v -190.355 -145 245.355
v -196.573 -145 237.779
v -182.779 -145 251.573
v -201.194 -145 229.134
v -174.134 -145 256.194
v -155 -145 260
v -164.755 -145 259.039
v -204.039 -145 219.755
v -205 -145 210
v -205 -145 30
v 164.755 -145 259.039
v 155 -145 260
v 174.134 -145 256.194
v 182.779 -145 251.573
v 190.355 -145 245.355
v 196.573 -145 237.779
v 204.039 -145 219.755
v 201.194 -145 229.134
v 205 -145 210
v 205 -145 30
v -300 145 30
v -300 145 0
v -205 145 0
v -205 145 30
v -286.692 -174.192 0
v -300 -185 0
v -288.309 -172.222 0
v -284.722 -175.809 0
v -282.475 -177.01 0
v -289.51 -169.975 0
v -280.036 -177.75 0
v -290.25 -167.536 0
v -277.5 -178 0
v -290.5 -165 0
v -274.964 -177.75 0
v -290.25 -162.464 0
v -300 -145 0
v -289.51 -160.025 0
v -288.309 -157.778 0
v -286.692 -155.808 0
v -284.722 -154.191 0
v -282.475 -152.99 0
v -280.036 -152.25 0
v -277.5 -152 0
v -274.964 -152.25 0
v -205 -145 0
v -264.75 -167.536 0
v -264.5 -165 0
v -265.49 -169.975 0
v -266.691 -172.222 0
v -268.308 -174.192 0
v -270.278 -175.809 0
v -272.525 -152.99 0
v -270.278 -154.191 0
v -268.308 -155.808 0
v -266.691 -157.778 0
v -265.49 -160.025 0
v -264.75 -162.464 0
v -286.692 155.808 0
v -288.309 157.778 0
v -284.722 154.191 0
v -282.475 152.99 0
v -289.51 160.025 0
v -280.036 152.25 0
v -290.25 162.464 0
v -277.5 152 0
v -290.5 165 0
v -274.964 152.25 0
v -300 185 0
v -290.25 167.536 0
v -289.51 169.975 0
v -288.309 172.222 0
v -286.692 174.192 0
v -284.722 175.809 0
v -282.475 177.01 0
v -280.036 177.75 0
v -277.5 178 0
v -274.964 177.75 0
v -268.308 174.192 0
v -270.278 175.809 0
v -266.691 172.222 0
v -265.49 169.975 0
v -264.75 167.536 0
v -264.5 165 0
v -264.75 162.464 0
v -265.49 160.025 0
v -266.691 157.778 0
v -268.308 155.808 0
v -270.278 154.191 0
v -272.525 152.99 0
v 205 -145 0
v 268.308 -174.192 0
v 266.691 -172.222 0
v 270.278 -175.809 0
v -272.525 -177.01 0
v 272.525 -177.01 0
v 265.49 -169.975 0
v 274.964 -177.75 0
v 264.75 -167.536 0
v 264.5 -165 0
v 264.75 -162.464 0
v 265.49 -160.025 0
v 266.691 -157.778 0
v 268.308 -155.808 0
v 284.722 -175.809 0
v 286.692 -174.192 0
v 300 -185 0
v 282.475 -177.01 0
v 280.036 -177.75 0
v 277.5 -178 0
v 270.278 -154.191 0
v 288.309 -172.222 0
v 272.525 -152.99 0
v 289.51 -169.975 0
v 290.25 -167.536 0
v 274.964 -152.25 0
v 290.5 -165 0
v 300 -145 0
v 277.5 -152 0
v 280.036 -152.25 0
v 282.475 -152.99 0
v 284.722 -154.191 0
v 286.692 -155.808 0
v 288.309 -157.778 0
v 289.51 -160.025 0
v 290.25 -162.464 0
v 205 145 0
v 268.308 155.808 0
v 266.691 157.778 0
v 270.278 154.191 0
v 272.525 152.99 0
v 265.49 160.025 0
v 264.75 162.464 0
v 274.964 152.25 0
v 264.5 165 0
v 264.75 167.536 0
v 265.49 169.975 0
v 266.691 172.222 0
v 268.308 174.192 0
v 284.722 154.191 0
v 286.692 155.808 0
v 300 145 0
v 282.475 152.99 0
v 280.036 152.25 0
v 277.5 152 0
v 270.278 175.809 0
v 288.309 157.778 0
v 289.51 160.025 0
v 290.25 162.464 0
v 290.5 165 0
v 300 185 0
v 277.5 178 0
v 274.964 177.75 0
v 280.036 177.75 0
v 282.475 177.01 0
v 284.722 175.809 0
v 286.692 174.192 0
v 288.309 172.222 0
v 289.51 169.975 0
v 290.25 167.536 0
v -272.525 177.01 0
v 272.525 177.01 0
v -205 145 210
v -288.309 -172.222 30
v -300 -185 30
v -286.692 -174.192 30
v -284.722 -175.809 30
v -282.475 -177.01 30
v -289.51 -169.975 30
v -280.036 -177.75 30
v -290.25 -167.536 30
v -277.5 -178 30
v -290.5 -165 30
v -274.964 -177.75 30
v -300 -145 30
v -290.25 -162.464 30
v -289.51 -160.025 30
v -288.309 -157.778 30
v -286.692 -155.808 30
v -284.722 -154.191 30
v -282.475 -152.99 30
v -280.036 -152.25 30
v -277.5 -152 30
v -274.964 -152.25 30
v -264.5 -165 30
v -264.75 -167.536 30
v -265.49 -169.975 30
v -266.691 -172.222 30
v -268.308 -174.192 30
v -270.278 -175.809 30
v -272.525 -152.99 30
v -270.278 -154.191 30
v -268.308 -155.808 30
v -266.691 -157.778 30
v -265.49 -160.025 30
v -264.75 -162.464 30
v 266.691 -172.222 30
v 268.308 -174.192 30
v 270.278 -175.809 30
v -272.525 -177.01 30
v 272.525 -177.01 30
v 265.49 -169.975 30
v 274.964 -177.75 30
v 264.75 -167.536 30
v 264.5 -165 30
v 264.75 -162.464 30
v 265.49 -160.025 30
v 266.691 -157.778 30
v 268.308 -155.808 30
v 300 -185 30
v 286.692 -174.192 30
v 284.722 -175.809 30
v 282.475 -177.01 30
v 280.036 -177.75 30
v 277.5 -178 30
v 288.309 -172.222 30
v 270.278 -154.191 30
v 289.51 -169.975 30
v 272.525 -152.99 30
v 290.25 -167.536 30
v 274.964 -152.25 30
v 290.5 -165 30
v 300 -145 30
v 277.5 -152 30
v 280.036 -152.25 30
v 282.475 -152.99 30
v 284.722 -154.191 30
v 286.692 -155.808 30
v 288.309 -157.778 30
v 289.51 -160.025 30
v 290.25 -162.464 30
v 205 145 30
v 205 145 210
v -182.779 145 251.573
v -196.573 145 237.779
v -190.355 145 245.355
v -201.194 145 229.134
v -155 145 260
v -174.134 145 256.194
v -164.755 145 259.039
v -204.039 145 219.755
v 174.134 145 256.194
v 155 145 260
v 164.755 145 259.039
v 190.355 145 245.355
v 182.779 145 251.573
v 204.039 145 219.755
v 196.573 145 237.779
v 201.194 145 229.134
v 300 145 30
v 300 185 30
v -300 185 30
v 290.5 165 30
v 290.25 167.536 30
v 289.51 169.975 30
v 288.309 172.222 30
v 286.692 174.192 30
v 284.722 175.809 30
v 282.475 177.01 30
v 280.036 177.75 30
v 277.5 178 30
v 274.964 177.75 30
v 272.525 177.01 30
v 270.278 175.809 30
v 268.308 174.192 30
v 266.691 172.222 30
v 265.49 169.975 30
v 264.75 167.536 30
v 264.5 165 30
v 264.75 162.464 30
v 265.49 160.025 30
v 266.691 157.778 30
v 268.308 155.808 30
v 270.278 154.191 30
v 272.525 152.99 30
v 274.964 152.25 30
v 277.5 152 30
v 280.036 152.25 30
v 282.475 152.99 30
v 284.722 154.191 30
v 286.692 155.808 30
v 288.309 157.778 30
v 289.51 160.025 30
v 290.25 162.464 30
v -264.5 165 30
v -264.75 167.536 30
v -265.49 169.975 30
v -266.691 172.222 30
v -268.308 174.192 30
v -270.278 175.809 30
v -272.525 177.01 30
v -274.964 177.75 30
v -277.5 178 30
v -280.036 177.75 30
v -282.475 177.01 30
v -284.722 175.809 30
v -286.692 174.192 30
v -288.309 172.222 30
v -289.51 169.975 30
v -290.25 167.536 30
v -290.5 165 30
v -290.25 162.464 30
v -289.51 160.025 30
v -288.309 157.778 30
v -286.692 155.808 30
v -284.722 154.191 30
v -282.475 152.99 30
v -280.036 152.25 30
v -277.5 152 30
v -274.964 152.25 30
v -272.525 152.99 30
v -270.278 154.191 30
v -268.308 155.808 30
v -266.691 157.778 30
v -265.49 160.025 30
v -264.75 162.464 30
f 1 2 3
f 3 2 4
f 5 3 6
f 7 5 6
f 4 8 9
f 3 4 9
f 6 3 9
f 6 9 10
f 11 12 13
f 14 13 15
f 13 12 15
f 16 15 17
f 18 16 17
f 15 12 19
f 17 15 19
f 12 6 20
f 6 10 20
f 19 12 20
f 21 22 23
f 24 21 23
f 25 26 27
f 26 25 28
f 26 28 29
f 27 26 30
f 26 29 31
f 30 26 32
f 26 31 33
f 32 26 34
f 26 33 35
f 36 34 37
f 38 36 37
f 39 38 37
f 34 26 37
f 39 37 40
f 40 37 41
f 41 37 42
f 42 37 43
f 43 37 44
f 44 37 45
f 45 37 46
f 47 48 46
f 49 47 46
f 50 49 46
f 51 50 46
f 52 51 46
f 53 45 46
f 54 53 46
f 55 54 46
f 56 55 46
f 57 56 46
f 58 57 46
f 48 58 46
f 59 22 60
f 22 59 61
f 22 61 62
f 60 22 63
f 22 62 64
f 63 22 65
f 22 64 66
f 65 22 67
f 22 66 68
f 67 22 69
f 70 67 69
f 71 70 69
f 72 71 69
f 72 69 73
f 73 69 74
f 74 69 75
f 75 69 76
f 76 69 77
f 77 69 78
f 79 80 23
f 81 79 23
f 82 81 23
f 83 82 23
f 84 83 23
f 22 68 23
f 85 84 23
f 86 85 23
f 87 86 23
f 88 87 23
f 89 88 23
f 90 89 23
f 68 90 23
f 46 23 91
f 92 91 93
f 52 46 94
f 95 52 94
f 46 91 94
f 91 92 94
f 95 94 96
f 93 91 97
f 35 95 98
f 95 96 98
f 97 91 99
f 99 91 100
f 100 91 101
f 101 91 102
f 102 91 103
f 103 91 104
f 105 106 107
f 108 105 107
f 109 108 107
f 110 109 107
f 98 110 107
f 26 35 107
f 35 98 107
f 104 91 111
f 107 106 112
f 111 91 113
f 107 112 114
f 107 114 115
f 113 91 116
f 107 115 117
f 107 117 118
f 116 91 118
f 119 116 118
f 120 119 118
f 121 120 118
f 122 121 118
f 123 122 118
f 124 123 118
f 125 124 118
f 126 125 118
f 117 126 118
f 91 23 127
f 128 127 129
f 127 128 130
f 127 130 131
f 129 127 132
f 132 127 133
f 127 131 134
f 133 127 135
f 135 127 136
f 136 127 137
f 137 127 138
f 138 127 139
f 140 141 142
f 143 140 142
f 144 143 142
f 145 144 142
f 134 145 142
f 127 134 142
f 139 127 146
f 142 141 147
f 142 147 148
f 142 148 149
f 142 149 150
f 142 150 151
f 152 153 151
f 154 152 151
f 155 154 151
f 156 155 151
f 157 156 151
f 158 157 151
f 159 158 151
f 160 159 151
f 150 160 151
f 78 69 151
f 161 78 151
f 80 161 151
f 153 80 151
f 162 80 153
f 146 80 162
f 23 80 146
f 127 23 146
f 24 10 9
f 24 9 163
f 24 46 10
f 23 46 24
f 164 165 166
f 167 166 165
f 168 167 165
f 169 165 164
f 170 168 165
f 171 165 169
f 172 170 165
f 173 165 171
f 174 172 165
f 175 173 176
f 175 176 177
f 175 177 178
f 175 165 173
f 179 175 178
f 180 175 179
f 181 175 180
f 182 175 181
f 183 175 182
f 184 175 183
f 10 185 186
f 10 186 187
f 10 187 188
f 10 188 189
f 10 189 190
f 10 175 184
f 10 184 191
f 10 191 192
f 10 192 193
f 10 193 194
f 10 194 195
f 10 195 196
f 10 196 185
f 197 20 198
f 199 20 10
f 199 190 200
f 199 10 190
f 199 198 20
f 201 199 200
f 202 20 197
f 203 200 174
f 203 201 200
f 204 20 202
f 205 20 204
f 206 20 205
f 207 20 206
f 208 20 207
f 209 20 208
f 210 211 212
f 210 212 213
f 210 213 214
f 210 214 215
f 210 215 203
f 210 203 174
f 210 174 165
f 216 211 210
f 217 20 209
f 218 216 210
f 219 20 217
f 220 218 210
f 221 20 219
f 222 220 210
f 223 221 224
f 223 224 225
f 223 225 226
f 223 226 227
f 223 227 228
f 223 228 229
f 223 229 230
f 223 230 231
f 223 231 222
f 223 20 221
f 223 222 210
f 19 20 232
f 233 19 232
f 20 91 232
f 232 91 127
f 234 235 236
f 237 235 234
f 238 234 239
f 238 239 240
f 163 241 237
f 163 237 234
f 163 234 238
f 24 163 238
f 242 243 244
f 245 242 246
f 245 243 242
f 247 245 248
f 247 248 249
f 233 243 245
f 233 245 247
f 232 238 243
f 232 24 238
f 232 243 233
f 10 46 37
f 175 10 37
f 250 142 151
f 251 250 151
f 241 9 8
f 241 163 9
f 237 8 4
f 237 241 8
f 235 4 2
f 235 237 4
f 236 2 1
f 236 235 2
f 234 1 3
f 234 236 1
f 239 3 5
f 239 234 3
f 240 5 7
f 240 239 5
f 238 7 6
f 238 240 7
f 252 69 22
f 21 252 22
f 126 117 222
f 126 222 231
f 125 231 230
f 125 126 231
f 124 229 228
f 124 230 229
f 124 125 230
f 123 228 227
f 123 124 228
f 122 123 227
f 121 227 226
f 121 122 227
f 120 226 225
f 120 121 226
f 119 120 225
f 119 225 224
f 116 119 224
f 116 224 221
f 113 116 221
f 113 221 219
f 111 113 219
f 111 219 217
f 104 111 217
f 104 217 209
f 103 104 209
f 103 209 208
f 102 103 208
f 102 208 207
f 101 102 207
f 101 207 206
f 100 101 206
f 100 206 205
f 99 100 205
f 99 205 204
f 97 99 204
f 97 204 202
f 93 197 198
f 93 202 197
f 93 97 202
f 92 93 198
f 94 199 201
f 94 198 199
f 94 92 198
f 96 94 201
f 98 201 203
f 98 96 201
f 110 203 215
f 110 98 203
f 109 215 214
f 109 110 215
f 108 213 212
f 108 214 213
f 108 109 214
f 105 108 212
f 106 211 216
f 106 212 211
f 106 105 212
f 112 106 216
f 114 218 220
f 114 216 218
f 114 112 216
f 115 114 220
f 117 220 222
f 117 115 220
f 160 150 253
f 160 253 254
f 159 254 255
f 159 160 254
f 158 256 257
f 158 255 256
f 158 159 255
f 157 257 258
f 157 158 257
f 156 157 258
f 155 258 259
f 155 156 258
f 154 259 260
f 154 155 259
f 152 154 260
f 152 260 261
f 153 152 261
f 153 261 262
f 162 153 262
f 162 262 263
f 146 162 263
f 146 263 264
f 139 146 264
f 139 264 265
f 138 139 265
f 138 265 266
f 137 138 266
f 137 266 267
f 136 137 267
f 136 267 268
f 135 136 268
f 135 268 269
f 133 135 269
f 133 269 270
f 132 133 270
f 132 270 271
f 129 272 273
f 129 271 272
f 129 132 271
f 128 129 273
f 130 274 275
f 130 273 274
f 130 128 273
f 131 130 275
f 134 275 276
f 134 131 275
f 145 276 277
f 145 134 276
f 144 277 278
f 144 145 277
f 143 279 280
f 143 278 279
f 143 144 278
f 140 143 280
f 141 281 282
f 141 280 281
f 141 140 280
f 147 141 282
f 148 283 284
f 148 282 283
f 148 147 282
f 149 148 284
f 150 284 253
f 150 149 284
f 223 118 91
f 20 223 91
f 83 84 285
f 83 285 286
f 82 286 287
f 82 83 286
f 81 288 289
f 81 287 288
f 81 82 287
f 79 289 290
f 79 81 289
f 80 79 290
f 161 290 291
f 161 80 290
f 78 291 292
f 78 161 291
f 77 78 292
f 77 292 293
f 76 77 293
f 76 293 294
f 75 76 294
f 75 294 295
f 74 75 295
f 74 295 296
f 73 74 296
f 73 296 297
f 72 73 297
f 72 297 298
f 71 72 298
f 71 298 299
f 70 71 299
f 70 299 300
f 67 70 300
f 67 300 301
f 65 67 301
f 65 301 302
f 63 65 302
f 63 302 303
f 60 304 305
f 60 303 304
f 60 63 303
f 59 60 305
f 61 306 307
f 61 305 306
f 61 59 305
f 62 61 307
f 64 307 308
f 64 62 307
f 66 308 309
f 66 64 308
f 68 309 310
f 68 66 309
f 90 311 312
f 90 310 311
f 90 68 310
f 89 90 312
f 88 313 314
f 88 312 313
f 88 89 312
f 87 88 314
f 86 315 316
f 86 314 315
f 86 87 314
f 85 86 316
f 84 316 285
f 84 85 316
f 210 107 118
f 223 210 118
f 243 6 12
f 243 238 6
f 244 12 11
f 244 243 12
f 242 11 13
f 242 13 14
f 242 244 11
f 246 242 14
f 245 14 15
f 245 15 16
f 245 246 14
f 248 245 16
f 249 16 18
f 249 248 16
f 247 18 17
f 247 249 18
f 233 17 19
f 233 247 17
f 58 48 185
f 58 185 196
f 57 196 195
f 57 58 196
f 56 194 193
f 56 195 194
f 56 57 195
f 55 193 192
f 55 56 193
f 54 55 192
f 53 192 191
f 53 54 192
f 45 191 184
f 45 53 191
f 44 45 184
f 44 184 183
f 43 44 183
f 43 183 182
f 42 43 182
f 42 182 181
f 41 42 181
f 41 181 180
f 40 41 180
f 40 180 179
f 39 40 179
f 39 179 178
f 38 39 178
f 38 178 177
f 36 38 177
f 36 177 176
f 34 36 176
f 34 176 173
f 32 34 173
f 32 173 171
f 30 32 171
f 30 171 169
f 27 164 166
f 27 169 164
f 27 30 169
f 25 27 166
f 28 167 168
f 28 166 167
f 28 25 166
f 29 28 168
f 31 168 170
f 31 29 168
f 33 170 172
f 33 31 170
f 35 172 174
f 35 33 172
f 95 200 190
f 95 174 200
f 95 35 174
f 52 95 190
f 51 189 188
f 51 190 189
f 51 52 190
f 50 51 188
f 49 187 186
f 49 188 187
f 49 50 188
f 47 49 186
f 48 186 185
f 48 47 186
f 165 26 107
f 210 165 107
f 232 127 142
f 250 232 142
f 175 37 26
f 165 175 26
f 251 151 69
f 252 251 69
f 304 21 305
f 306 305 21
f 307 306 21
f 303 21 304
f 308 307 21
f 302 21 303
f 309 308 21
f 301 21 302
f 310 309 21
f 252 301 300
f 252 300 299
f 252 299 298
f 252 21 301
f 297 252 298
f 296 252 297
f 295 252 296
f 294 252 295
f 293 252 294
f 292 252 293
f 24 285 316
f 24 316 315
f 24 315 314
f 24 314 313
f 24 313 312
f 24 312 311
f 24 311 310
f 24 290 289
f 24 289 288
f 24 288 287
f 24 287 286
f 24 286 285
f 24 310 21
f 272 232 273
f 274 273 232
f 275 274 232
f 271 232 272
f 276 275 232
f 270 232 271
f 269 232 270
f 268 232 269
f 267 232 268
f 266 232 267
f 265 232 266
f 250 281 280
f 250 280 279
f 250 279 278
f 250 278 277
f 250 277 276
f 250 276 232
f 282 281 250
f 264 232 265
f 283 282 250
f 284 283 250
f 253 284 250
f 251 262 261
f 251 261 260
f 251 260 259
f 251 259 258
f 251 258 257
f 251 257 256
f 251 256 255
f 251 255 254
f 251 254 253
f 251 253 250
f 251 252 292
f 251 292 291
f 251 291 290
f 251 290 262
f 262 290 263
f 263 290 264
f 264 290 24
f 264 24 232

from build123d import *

# Parameters (mm, degrees)
BOSS_EXTRU_1_DEPTH           = 30
ENL_V_MAT_EXTRU_1_DEPTH      = 354.730123116
ENL_V_MAT_EXTRU_1_DEPTH_BACK = 354.730123116
ESQUISSE2_R                  = 13
ESQUISSE3_W                  = 410
ESQUISSE3_H                  = 290
BOSS_EXTRU_2_DEPTH           = 230
CONG_1_R                     = 50


with BuildPart() as part:
    # Esquisse1 → Boss.-Extru.1 (new body)
    with BuildSketch(Plane.XY):
        Polygon((300, 185), (-300, 185), (-300, 145), (-205, 145), (-205, -145), (-300, -145), (-300, -185), (300, -185), (300, -145), (205, -145), (205, 145), (300, 145), align=None)
    extrude(amount=BOSS_EXTRU_1_DEPTH)

    # Esquisse2 → Enlèv. mat.-Extru.1 (cut, two sides: drawn at the far end of the back side and taken through both)
    with BuildSketch(Plane.XY.offset(30).offset(-ENL_V_MAT_EXTRU_1_DEPTH_BACK)):
        with Locations((-277.5, 165)):
            Circle(ESQUISSE2_R)
        with Locations((277.5, 165)):
            Circle(ESQUISSE2_R)
        with Locations((277.5, -165)):
            Circle(ESQUISSE2_R)
        with Locations((-277.5, -165)):
            Circle(ESQUISSE2_R)
    extrude(amount=ENL_V_MAT_EXTRU_1_DEPTH + ENL_V_MAT_EXTRU_1_DEPTH_BACK, mode=Mode.SUBTRACT)

    # Esquisse3 → Boss.-Extru.2 (add)
    with BuildSketch(Plane.XY.offset(30)):
        Rectangle(ESQUISSE3_W, ESQUISSE3_H)
    extrude(amount=BOSS_EXTRU_2_DEPTH)

    # Congé1
    cong_1_edges = [part.edges().sort_by_distance(p)[0] for p in [
        (-205, 0, 260),
        (205, 0, 260),
    ]]
    fillet(cong_1_edges, radius=CONG_1_R)


solid = part.part
